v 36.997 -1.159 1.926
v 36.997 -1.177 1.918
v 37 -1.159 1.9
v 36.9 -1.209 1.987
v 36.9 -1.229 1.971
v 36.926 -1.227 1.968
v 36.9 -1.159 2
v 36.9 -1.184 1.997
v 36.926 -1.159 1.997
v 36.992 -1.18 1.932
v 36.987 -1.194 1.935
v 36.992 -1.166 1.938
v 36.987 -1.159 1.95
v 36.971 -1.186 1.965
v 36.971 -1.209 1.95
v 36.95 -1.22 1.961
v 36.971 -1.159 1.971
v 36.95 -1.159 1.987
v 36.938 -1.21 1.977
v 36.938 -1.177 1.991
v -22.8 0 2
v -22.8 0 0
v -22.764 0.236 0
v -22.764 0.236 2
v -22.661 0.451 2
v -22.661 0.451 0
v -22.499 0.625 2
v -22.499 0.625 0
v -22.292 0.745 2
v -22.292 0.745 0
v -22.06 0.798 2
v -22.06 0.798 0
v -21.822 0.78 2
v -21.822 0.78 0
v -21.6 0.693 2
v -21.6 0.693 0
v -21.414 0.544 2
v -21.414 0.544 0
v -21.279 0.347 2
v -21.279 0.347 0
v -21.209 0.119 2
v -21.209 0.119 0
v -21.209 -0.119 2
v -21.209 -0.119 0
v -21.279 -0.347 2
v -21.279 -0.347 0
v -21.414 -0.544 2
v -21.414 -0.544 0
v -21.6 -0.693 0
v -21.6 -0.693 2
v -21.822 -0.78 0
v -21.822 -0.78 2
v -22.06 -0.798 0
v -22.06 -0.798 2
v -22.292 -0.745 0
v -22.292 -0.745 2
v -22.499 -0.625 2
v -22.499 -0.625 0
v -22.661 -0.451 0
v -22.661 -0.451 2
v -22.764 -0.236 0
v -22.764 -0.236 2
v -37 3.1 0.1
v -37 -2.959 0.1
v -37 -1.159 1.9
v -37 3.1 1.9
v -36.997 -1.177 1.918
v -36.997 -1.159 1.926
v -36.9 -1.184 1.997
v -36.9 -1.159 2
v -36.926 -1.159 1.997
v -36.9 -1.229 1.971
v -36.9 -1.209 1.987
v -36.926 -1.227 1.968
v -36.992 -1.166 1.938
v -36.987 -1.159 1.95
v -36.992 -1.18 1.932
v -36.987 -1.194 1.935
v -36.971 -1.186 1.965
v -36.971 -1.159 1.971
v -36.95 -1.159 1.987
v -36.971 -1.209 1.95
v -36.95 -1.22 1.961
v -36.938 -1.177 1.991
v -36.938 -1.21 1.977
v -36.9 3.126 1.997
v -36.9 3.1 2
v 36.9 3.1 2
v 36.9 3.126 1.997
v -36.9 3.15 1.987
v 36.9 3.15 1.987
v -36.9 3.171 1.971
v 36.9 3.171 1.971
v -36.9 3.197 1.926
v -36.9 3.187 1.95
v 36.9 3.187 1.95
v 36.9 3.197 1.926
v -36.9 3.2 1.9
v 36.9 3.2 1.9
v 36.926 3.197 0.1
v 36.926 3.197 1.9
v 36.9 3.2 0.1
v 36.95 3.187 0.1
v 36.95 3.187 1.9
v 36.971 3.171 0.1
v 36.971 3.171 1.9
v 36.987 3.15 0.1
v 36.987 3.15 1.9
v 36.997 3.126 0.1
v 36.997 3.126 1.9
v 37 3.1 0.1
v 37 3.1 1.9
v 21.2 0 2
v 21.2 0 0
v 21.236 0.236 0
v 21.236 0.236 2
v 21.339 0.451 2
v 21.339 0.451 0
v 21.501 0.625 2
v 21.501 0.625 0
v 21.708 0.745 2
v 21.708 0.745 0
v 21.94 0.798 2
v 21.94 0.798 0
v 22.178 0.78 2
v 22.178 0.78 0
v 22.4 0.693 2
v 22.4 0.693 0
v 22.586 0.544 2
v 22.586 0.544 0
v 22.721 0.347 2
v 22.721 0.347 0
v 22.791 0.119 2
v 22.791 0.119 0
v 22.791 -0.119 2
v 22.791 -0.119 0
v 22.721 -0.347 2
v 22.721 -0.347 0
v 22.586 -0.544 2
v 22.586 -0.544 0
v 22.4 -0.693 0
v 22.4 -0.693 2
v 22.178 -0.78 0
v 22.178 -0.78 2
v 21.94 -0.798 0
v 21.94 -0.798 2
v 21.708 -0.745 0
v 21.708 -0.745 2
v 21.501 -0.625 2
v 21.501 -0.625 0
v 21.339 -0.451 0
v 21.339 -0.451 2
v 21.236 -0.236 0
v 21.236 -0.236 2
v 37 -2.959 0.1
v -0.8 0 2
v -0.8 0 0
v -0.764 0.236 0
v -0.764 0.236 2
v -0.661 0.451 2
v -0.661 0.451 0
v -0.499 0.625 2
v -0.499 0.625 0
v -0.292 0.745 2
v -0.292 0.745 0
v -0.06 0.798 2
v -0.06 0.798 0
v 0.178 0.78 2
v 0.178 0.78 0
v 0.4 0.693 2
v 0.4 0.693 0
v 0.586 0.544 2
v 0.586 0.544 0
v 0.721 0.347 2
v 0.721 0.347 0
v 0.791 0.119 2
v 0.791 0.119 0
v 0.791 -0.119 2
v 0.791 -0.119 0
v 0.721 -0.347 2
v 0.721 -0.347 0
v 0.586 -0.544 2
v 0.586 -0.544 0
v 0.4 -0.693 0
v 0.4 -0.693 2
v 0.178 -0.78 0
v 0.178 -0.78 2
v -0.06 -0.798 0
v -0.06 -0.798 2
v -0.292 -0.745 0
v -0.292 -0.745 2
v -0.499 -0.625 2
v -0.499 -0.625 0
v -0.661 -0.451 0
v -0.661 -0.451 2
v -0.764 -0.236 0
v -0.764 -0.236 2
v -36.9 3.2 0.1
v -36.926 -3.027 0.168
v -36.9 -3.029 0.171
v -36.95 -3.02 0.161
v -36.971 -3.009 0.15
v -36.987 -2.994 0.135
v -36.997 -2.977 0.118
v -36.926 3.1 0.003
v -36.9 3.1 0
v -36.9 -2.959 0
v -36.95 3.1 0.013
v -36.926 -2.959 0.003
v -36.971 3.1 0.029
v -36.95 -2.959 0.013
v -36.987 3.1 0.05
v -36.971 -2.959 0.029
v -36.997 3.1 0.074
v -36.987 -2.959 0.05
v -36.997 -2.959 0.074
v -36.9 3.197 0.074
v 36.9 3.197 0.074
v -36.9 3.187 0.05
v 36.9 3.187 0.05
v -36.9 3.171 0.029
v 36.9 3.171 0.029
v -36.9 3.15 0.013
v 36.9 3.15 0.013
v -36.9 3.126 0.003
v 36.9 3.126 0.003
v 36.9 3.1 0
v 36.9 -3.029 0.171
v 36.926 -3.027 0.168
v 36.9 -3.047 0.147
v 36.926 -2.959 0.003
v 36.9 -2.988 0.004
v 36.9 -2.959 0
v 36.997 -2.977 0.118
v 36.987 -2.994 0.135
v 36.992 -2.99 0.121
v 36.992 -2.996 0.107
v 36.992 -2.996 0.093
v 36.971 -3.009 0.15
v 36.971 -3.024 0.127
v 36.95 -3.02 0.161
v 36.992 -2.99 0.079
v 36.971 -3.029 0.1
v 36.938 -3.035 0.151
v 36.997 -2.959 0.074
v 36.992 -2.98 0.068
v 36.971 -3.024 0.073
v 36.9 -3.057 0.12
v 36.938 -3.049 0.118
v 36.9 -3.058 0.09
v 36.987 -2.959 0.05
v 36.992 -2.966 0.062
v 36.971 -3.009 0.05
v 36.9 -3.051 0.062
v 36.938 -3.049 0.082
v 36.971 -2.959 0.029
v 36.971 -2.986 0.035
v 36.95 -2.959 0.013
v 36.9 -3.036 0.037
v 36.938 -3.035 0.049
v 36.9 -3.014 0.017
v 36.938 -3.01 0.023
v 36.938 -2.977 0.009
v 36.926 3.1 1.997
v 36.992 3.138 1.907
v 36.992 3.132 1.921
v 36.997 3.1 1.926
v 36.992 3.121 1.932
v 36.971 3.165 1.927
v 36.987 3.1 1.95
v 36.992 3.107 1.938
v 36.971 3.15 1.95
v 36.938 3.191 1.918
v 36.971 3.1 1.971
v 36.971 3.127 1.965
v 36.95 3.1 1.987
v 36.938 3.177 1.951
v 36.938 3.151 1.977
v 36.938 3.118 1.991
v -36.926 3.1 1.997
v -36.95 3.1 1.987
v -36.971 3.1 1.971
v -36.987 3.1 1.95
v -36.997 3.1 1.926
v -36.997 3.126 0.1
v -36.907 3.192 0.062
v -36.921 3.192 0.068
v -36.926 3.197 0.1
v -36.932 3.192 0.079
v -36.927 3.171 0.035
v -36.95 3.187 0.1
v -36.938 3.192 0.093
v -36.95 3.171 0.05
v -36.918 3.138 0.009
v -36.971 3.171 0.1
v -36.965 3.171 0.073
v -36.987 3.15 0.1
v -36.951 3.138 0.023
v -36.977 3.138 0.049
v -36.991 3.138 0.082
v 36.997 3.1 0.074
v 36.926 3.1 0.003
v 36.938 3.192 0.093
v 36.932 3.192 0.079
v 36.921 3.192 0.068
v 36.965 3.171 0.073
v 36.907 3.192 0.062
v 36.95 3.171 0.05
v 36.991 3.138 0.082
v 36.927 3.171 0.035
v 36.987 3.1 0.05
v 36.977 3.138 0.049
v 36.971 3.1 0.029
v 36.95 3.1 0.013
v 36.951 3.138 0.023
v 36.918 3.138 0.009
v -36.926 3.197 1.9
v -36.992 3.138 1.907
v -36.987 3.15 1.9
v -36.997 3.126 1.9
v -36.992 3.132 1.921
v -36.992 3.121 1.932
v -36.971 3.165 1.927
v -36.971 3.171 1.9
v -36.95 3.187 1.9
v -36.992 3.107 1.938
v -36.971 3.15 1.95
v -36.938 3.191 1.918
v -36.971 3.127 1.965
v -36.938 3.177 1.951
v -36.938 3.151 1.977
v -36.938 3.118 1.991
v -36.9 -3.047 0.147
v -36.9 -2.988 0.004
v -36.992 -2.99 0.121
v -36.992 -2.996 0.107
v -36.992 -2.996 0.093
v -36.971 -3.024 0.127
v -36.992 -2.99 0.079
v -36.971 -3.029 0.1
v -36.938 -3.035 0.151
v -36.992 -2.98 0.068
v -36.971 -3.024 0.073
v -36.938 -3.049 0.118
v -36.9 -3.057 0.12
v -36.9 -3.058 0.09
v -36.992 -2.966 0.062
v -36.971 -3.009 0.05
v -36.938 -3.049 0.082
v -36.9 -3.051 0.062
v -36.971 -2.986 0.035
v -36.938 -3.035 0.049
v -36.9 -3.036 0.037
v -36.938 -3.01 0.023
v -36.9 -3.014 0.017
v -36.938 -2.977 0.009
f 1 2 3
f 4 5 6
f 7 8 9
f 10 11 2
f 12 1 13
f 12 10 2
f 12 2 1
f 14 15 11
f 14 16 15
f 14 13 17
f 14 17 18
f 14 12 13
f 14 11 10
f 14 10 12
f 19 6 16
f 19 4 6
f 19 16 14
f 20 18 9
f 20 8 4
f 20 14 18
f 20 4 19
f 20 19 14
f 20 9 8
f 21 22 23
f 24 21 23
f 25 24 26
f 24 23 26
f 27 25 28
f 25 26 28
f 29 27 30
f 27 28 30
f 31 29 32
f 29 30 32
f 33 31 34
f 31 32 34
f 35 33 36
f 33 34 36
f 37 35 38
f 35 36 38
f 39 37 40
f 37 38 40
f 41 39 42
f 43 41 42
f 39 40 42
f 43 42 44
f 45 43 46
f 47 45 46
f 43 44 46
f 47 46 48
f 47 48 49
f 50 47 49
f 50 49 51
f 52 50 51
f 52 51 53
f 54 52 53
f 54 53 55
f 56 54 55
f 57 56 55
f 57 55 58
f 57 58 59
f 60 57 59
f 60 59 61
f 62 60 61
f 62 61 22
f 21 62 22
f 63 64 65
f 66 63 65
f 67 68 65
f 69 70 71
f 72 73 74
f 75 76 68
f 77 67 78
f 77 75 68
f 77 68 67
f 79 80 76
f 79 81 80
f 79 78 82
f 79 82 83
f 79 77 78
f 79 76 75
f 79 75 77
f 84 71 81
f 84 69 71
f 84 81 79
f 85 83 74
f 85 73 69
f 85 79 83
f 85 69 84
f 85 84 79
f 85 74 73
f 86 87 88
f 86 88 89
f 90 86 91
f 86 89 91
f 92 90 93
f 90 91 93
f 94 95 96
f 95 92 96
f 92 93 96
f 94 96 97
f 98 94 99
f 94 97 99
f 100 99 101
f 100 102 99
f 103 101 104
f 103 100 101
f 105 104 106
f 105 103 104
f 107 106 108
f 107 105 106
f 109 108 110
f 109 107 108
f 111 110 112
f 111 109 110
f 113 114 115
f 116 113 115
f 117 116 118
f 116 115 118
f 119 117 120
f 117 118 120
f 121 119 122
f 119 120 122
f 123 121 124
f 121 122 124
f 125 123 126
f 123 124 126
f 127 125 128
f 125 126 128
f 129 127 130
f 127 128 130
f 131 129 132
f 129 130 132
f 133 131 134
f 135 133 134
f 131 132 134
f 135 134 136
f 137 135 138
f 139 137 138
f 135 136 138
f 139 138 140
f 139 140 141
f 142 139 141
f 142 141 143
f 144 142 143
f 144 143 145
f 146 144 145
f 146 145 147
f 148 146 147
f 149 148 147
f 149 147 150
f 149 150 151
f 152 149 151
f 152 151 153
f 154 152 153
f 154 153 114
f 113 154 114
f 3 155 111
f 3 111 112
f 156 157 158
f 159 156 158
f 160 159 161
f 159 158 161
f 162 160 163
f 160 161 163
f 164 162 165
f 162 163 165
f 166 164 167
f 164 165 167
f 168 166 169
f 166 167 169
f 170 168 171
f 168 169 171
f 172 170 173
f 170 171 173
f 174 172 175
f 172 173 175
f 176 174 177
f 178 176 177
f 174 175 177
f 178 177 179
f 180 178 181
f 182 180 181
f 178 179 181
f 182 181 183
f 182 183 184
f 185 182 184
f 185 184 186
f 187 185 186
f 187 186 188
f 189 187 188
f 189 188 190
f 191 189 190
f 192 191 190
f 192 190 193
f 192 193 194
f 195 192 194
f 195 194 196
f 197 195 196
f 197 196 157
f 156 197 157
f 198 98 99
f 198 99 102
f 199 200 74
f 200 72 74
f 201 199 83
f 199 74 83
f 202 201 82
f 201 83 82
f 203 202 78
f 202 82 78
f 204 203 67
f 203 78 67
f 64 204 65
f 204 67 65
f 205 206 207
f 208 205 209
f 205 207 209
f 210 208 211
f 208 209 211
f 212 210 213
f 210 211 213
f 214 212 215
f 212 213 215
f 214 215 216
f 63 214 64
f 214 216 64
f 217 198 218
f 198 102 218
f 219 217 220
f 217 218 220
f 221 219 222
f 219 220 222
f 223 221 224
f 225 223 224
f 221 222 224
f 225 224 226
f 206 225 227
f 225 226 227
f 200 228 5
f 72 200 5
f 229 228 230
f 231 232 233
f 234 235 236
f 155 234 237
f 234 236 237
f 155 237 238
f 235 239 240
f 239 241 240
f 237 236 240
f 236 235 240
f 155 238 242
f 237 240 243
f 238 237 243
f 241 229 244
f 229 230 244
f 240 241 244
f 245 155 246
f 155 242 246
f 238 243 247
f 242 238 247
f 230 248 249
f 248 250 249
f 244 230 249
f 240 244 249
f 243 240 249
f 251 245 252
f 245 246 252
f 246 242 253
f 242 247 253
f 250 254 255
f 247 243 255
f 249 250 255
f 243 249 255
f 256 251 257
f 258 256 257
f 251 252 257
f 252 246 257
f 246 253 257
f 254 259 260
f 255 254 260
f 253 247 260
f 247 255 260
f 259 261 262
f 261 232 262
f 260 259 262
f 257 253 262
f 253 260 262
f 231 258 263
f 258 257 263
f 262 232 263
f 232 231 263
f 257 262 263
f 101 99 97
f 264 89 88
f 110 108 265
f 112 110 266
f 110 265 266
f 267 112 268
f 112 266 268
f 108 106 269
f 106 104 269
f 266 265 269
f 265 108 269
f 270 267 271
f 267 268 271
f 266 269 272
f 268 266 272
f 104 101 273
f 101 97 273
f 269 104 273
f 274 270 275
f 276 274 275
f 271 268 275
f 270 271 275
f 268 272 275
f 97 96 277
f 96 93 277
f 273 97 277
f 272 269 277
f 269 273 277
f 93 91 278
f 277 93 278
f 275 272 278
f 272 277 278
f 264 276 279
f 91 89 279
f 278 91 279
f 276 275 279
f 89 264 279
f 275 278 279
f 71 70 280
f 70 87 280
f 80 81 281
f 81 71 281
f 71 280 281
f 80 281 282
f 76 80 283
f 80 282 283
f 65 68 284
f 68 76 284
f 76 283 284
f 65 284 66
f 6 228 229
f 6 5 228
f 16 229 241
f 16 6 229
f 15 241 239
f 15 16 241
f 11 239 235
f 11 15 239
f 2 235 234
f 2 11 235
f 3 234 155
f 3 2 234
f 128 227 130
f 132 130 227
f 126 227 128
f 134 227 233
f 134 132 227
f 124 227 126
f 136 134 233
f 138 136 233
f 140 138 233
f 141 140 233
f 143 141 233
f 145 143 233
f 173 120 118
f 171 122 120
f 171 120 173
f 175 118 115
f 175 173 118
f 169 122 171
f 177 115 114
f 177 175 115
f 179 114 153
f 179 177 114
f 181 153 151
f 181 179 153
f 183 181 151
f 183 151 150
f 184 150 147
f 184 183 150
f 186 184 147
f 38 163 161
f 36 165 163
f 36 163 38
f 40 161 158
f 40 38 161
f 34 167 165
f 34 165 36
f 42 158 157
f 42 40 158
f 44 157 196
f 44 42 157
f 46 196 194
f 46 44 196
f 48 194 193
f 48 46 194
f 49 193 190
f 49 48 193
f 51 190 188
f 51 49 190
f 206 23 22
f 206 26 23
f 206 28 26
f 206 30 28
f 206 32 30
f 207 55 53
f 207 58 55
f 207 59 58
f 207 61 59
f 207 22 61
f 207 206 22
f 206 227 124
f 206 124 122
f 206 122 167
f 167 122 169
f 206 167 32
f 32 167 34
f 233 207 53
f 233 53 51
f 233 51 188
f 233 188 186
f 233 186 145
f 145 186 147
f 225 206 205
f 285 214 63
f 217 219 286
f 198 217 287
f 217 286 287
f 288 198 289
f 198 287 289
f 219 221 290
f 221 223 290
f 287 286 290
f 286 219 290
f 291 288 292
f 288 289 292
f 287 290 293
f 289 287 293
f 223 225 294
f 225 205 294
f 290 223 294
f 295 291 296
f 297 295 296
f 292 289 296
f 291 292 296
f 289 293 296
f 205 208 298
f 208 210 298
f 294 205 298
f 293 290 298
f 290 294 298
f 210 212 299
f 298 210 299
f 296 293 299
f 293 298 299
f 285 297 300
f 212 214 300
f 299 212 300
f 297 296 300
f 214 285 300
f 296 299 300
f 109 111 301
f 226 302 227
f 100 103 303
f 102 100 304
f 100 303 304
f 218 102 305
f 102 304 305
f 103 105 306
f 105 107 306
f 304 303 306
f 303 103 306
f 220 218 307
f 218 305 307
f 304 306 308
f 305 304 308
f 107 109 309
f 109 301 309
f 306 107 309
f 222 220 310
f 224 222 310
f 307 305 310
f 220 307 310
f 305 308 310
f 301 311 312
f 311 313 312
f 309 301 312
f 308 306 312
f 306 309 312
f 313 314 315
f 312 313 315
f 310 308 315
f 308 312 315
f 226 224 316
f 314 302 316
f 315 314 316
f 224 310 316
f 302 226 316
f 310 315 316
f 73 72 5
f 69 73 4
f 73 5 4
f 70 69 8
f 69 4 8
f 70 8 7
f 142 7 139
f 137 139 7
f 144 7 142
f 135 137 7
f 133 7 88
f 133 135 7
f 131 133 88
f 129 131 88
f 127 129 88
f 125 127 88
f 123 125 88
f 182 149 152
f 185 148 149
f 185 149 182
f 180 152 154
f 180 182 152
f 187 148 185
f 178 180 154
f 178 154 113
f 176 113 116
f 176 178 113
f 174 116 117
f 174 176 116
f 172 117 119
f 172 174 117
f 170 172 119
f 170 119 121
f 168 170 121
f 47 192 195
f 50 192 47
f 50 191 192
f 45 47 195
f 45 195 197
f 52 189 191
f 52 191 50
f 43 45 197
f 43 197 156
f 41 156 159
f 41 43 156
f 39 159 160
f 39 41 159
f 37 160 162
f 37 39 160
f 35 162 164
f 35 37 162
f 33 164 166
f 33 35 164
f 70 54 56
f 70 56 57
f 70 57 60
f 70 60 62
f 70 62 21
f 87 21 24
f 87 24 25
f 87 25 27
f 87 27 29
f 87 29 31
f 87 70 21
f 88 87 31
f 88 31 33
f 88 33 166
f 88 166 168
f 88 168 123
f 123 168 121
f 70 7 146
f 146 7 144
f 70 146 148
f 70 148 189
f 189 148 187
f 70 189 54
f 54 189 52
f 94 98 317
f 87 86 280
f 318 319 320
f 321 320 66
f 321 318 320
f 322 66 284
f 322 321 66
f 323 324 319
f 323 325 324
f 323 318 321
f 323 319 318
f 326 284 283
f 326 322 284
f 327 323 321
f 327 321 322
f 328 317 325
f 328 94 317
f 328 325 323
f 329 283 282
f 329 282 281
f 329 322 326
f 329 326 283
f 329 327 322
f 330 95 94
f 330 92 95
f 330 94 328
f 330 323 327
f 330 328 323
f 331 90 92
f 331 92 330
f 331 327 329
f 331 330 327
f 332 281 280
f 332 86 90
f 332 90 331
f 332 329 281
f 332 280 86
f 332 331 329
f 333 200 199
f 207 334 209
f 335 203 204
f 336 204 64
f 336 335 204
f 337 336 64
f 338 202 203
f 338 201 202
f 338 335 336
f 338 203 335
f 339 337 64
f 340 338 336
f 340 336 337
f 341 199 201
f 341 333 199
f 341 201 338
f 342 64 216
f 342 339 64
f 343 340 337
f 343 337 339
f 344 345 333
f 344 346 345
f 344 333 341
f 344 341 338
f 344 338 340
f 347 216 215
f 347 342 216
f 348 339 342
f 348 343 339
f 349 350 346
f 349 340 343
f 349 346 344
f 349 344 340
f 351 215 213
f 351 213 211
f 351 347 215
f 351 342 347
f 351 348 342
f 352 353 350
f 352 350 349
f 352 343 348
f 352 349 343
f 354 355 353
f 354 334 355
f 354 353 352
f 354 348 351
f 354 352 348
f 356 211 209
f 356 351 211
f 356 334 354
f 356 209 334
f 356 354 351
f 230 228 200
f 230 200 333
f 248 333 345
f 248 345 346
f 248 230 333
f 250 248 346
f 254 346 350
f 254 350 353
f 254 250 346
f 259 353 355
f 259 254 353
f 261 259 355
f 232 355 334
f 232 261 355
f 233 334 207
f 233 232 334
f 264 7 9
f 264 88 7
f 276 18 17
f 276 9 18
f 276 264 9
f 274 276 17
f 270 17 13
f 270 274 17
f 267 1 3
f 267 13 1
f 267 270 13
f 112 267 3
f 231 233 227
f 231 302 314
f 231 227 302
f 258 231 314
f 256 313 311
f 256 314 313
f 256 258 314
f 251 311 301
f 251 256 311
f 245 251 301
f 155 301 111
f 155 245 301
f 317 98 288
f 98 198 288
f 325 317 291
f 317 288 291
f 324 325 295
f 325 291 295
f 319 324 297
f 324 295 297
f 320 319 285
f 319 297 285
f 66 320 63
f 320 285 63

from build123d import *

# Parameters (mm, degrees)
BOSS_EXTRUDE1_DEPTH      = 37
BOSS_EXTRUDE1_DEPTH_BACK = 37
FILLET1_R                = 0.1
M2X0_4_TAPPED_HOLE1_D    = 1.6


with BuildPart() as part:
    # Sketch1 → Boss-Extrude1 (new, two sides: drawn at the far end of the back side and taken through both)
    with BuildSketch(Plane(origin=(0, 0, 0), x_dir=(0, 0, -1), z_dir=(1, 0, 0)).offset(-BOSS_EXTRUDE1_DEPTH_BACK)):
        Polygon((0, -3.2), (-2, -1.2), (-2, 3.2), (0, 3.2), align=None)
    extrude(amount=BOSS_EXTRUDE1_DEPTH + BOSS_EXTRUDE1_DEPTH_BACK)

    # Fillet1
    fillet1_edges = [part.edges().sort_by_distance(p)[0] for p in [
        (-37, -2.2, 1),
        (-37, 0, 0),
        (0, 3.2, 2),
        (0, -1.2, 2),
        (37, -2.2, 1),
        (37, 0, 0),
        (37, 3.2, 1),
        (37, 1, 2),
        (0, -3.2, 0),
        (0, 3.2, 0),
        (-37, 3.2, 1),
        (-37, 1, 2),
    ]]
    fillet(fillet1_edges, radius=FILLET1_R)

    # M2x0.4 Tapped Hole1 (through all)
    with Locations(Plane.XY.offset(2)):
        with Locations((22, 0), (0, 0), (-22, 0)):
            Hole(M2X0_4_TAPPED_HOLE1_D / 2)


solid = part.part
